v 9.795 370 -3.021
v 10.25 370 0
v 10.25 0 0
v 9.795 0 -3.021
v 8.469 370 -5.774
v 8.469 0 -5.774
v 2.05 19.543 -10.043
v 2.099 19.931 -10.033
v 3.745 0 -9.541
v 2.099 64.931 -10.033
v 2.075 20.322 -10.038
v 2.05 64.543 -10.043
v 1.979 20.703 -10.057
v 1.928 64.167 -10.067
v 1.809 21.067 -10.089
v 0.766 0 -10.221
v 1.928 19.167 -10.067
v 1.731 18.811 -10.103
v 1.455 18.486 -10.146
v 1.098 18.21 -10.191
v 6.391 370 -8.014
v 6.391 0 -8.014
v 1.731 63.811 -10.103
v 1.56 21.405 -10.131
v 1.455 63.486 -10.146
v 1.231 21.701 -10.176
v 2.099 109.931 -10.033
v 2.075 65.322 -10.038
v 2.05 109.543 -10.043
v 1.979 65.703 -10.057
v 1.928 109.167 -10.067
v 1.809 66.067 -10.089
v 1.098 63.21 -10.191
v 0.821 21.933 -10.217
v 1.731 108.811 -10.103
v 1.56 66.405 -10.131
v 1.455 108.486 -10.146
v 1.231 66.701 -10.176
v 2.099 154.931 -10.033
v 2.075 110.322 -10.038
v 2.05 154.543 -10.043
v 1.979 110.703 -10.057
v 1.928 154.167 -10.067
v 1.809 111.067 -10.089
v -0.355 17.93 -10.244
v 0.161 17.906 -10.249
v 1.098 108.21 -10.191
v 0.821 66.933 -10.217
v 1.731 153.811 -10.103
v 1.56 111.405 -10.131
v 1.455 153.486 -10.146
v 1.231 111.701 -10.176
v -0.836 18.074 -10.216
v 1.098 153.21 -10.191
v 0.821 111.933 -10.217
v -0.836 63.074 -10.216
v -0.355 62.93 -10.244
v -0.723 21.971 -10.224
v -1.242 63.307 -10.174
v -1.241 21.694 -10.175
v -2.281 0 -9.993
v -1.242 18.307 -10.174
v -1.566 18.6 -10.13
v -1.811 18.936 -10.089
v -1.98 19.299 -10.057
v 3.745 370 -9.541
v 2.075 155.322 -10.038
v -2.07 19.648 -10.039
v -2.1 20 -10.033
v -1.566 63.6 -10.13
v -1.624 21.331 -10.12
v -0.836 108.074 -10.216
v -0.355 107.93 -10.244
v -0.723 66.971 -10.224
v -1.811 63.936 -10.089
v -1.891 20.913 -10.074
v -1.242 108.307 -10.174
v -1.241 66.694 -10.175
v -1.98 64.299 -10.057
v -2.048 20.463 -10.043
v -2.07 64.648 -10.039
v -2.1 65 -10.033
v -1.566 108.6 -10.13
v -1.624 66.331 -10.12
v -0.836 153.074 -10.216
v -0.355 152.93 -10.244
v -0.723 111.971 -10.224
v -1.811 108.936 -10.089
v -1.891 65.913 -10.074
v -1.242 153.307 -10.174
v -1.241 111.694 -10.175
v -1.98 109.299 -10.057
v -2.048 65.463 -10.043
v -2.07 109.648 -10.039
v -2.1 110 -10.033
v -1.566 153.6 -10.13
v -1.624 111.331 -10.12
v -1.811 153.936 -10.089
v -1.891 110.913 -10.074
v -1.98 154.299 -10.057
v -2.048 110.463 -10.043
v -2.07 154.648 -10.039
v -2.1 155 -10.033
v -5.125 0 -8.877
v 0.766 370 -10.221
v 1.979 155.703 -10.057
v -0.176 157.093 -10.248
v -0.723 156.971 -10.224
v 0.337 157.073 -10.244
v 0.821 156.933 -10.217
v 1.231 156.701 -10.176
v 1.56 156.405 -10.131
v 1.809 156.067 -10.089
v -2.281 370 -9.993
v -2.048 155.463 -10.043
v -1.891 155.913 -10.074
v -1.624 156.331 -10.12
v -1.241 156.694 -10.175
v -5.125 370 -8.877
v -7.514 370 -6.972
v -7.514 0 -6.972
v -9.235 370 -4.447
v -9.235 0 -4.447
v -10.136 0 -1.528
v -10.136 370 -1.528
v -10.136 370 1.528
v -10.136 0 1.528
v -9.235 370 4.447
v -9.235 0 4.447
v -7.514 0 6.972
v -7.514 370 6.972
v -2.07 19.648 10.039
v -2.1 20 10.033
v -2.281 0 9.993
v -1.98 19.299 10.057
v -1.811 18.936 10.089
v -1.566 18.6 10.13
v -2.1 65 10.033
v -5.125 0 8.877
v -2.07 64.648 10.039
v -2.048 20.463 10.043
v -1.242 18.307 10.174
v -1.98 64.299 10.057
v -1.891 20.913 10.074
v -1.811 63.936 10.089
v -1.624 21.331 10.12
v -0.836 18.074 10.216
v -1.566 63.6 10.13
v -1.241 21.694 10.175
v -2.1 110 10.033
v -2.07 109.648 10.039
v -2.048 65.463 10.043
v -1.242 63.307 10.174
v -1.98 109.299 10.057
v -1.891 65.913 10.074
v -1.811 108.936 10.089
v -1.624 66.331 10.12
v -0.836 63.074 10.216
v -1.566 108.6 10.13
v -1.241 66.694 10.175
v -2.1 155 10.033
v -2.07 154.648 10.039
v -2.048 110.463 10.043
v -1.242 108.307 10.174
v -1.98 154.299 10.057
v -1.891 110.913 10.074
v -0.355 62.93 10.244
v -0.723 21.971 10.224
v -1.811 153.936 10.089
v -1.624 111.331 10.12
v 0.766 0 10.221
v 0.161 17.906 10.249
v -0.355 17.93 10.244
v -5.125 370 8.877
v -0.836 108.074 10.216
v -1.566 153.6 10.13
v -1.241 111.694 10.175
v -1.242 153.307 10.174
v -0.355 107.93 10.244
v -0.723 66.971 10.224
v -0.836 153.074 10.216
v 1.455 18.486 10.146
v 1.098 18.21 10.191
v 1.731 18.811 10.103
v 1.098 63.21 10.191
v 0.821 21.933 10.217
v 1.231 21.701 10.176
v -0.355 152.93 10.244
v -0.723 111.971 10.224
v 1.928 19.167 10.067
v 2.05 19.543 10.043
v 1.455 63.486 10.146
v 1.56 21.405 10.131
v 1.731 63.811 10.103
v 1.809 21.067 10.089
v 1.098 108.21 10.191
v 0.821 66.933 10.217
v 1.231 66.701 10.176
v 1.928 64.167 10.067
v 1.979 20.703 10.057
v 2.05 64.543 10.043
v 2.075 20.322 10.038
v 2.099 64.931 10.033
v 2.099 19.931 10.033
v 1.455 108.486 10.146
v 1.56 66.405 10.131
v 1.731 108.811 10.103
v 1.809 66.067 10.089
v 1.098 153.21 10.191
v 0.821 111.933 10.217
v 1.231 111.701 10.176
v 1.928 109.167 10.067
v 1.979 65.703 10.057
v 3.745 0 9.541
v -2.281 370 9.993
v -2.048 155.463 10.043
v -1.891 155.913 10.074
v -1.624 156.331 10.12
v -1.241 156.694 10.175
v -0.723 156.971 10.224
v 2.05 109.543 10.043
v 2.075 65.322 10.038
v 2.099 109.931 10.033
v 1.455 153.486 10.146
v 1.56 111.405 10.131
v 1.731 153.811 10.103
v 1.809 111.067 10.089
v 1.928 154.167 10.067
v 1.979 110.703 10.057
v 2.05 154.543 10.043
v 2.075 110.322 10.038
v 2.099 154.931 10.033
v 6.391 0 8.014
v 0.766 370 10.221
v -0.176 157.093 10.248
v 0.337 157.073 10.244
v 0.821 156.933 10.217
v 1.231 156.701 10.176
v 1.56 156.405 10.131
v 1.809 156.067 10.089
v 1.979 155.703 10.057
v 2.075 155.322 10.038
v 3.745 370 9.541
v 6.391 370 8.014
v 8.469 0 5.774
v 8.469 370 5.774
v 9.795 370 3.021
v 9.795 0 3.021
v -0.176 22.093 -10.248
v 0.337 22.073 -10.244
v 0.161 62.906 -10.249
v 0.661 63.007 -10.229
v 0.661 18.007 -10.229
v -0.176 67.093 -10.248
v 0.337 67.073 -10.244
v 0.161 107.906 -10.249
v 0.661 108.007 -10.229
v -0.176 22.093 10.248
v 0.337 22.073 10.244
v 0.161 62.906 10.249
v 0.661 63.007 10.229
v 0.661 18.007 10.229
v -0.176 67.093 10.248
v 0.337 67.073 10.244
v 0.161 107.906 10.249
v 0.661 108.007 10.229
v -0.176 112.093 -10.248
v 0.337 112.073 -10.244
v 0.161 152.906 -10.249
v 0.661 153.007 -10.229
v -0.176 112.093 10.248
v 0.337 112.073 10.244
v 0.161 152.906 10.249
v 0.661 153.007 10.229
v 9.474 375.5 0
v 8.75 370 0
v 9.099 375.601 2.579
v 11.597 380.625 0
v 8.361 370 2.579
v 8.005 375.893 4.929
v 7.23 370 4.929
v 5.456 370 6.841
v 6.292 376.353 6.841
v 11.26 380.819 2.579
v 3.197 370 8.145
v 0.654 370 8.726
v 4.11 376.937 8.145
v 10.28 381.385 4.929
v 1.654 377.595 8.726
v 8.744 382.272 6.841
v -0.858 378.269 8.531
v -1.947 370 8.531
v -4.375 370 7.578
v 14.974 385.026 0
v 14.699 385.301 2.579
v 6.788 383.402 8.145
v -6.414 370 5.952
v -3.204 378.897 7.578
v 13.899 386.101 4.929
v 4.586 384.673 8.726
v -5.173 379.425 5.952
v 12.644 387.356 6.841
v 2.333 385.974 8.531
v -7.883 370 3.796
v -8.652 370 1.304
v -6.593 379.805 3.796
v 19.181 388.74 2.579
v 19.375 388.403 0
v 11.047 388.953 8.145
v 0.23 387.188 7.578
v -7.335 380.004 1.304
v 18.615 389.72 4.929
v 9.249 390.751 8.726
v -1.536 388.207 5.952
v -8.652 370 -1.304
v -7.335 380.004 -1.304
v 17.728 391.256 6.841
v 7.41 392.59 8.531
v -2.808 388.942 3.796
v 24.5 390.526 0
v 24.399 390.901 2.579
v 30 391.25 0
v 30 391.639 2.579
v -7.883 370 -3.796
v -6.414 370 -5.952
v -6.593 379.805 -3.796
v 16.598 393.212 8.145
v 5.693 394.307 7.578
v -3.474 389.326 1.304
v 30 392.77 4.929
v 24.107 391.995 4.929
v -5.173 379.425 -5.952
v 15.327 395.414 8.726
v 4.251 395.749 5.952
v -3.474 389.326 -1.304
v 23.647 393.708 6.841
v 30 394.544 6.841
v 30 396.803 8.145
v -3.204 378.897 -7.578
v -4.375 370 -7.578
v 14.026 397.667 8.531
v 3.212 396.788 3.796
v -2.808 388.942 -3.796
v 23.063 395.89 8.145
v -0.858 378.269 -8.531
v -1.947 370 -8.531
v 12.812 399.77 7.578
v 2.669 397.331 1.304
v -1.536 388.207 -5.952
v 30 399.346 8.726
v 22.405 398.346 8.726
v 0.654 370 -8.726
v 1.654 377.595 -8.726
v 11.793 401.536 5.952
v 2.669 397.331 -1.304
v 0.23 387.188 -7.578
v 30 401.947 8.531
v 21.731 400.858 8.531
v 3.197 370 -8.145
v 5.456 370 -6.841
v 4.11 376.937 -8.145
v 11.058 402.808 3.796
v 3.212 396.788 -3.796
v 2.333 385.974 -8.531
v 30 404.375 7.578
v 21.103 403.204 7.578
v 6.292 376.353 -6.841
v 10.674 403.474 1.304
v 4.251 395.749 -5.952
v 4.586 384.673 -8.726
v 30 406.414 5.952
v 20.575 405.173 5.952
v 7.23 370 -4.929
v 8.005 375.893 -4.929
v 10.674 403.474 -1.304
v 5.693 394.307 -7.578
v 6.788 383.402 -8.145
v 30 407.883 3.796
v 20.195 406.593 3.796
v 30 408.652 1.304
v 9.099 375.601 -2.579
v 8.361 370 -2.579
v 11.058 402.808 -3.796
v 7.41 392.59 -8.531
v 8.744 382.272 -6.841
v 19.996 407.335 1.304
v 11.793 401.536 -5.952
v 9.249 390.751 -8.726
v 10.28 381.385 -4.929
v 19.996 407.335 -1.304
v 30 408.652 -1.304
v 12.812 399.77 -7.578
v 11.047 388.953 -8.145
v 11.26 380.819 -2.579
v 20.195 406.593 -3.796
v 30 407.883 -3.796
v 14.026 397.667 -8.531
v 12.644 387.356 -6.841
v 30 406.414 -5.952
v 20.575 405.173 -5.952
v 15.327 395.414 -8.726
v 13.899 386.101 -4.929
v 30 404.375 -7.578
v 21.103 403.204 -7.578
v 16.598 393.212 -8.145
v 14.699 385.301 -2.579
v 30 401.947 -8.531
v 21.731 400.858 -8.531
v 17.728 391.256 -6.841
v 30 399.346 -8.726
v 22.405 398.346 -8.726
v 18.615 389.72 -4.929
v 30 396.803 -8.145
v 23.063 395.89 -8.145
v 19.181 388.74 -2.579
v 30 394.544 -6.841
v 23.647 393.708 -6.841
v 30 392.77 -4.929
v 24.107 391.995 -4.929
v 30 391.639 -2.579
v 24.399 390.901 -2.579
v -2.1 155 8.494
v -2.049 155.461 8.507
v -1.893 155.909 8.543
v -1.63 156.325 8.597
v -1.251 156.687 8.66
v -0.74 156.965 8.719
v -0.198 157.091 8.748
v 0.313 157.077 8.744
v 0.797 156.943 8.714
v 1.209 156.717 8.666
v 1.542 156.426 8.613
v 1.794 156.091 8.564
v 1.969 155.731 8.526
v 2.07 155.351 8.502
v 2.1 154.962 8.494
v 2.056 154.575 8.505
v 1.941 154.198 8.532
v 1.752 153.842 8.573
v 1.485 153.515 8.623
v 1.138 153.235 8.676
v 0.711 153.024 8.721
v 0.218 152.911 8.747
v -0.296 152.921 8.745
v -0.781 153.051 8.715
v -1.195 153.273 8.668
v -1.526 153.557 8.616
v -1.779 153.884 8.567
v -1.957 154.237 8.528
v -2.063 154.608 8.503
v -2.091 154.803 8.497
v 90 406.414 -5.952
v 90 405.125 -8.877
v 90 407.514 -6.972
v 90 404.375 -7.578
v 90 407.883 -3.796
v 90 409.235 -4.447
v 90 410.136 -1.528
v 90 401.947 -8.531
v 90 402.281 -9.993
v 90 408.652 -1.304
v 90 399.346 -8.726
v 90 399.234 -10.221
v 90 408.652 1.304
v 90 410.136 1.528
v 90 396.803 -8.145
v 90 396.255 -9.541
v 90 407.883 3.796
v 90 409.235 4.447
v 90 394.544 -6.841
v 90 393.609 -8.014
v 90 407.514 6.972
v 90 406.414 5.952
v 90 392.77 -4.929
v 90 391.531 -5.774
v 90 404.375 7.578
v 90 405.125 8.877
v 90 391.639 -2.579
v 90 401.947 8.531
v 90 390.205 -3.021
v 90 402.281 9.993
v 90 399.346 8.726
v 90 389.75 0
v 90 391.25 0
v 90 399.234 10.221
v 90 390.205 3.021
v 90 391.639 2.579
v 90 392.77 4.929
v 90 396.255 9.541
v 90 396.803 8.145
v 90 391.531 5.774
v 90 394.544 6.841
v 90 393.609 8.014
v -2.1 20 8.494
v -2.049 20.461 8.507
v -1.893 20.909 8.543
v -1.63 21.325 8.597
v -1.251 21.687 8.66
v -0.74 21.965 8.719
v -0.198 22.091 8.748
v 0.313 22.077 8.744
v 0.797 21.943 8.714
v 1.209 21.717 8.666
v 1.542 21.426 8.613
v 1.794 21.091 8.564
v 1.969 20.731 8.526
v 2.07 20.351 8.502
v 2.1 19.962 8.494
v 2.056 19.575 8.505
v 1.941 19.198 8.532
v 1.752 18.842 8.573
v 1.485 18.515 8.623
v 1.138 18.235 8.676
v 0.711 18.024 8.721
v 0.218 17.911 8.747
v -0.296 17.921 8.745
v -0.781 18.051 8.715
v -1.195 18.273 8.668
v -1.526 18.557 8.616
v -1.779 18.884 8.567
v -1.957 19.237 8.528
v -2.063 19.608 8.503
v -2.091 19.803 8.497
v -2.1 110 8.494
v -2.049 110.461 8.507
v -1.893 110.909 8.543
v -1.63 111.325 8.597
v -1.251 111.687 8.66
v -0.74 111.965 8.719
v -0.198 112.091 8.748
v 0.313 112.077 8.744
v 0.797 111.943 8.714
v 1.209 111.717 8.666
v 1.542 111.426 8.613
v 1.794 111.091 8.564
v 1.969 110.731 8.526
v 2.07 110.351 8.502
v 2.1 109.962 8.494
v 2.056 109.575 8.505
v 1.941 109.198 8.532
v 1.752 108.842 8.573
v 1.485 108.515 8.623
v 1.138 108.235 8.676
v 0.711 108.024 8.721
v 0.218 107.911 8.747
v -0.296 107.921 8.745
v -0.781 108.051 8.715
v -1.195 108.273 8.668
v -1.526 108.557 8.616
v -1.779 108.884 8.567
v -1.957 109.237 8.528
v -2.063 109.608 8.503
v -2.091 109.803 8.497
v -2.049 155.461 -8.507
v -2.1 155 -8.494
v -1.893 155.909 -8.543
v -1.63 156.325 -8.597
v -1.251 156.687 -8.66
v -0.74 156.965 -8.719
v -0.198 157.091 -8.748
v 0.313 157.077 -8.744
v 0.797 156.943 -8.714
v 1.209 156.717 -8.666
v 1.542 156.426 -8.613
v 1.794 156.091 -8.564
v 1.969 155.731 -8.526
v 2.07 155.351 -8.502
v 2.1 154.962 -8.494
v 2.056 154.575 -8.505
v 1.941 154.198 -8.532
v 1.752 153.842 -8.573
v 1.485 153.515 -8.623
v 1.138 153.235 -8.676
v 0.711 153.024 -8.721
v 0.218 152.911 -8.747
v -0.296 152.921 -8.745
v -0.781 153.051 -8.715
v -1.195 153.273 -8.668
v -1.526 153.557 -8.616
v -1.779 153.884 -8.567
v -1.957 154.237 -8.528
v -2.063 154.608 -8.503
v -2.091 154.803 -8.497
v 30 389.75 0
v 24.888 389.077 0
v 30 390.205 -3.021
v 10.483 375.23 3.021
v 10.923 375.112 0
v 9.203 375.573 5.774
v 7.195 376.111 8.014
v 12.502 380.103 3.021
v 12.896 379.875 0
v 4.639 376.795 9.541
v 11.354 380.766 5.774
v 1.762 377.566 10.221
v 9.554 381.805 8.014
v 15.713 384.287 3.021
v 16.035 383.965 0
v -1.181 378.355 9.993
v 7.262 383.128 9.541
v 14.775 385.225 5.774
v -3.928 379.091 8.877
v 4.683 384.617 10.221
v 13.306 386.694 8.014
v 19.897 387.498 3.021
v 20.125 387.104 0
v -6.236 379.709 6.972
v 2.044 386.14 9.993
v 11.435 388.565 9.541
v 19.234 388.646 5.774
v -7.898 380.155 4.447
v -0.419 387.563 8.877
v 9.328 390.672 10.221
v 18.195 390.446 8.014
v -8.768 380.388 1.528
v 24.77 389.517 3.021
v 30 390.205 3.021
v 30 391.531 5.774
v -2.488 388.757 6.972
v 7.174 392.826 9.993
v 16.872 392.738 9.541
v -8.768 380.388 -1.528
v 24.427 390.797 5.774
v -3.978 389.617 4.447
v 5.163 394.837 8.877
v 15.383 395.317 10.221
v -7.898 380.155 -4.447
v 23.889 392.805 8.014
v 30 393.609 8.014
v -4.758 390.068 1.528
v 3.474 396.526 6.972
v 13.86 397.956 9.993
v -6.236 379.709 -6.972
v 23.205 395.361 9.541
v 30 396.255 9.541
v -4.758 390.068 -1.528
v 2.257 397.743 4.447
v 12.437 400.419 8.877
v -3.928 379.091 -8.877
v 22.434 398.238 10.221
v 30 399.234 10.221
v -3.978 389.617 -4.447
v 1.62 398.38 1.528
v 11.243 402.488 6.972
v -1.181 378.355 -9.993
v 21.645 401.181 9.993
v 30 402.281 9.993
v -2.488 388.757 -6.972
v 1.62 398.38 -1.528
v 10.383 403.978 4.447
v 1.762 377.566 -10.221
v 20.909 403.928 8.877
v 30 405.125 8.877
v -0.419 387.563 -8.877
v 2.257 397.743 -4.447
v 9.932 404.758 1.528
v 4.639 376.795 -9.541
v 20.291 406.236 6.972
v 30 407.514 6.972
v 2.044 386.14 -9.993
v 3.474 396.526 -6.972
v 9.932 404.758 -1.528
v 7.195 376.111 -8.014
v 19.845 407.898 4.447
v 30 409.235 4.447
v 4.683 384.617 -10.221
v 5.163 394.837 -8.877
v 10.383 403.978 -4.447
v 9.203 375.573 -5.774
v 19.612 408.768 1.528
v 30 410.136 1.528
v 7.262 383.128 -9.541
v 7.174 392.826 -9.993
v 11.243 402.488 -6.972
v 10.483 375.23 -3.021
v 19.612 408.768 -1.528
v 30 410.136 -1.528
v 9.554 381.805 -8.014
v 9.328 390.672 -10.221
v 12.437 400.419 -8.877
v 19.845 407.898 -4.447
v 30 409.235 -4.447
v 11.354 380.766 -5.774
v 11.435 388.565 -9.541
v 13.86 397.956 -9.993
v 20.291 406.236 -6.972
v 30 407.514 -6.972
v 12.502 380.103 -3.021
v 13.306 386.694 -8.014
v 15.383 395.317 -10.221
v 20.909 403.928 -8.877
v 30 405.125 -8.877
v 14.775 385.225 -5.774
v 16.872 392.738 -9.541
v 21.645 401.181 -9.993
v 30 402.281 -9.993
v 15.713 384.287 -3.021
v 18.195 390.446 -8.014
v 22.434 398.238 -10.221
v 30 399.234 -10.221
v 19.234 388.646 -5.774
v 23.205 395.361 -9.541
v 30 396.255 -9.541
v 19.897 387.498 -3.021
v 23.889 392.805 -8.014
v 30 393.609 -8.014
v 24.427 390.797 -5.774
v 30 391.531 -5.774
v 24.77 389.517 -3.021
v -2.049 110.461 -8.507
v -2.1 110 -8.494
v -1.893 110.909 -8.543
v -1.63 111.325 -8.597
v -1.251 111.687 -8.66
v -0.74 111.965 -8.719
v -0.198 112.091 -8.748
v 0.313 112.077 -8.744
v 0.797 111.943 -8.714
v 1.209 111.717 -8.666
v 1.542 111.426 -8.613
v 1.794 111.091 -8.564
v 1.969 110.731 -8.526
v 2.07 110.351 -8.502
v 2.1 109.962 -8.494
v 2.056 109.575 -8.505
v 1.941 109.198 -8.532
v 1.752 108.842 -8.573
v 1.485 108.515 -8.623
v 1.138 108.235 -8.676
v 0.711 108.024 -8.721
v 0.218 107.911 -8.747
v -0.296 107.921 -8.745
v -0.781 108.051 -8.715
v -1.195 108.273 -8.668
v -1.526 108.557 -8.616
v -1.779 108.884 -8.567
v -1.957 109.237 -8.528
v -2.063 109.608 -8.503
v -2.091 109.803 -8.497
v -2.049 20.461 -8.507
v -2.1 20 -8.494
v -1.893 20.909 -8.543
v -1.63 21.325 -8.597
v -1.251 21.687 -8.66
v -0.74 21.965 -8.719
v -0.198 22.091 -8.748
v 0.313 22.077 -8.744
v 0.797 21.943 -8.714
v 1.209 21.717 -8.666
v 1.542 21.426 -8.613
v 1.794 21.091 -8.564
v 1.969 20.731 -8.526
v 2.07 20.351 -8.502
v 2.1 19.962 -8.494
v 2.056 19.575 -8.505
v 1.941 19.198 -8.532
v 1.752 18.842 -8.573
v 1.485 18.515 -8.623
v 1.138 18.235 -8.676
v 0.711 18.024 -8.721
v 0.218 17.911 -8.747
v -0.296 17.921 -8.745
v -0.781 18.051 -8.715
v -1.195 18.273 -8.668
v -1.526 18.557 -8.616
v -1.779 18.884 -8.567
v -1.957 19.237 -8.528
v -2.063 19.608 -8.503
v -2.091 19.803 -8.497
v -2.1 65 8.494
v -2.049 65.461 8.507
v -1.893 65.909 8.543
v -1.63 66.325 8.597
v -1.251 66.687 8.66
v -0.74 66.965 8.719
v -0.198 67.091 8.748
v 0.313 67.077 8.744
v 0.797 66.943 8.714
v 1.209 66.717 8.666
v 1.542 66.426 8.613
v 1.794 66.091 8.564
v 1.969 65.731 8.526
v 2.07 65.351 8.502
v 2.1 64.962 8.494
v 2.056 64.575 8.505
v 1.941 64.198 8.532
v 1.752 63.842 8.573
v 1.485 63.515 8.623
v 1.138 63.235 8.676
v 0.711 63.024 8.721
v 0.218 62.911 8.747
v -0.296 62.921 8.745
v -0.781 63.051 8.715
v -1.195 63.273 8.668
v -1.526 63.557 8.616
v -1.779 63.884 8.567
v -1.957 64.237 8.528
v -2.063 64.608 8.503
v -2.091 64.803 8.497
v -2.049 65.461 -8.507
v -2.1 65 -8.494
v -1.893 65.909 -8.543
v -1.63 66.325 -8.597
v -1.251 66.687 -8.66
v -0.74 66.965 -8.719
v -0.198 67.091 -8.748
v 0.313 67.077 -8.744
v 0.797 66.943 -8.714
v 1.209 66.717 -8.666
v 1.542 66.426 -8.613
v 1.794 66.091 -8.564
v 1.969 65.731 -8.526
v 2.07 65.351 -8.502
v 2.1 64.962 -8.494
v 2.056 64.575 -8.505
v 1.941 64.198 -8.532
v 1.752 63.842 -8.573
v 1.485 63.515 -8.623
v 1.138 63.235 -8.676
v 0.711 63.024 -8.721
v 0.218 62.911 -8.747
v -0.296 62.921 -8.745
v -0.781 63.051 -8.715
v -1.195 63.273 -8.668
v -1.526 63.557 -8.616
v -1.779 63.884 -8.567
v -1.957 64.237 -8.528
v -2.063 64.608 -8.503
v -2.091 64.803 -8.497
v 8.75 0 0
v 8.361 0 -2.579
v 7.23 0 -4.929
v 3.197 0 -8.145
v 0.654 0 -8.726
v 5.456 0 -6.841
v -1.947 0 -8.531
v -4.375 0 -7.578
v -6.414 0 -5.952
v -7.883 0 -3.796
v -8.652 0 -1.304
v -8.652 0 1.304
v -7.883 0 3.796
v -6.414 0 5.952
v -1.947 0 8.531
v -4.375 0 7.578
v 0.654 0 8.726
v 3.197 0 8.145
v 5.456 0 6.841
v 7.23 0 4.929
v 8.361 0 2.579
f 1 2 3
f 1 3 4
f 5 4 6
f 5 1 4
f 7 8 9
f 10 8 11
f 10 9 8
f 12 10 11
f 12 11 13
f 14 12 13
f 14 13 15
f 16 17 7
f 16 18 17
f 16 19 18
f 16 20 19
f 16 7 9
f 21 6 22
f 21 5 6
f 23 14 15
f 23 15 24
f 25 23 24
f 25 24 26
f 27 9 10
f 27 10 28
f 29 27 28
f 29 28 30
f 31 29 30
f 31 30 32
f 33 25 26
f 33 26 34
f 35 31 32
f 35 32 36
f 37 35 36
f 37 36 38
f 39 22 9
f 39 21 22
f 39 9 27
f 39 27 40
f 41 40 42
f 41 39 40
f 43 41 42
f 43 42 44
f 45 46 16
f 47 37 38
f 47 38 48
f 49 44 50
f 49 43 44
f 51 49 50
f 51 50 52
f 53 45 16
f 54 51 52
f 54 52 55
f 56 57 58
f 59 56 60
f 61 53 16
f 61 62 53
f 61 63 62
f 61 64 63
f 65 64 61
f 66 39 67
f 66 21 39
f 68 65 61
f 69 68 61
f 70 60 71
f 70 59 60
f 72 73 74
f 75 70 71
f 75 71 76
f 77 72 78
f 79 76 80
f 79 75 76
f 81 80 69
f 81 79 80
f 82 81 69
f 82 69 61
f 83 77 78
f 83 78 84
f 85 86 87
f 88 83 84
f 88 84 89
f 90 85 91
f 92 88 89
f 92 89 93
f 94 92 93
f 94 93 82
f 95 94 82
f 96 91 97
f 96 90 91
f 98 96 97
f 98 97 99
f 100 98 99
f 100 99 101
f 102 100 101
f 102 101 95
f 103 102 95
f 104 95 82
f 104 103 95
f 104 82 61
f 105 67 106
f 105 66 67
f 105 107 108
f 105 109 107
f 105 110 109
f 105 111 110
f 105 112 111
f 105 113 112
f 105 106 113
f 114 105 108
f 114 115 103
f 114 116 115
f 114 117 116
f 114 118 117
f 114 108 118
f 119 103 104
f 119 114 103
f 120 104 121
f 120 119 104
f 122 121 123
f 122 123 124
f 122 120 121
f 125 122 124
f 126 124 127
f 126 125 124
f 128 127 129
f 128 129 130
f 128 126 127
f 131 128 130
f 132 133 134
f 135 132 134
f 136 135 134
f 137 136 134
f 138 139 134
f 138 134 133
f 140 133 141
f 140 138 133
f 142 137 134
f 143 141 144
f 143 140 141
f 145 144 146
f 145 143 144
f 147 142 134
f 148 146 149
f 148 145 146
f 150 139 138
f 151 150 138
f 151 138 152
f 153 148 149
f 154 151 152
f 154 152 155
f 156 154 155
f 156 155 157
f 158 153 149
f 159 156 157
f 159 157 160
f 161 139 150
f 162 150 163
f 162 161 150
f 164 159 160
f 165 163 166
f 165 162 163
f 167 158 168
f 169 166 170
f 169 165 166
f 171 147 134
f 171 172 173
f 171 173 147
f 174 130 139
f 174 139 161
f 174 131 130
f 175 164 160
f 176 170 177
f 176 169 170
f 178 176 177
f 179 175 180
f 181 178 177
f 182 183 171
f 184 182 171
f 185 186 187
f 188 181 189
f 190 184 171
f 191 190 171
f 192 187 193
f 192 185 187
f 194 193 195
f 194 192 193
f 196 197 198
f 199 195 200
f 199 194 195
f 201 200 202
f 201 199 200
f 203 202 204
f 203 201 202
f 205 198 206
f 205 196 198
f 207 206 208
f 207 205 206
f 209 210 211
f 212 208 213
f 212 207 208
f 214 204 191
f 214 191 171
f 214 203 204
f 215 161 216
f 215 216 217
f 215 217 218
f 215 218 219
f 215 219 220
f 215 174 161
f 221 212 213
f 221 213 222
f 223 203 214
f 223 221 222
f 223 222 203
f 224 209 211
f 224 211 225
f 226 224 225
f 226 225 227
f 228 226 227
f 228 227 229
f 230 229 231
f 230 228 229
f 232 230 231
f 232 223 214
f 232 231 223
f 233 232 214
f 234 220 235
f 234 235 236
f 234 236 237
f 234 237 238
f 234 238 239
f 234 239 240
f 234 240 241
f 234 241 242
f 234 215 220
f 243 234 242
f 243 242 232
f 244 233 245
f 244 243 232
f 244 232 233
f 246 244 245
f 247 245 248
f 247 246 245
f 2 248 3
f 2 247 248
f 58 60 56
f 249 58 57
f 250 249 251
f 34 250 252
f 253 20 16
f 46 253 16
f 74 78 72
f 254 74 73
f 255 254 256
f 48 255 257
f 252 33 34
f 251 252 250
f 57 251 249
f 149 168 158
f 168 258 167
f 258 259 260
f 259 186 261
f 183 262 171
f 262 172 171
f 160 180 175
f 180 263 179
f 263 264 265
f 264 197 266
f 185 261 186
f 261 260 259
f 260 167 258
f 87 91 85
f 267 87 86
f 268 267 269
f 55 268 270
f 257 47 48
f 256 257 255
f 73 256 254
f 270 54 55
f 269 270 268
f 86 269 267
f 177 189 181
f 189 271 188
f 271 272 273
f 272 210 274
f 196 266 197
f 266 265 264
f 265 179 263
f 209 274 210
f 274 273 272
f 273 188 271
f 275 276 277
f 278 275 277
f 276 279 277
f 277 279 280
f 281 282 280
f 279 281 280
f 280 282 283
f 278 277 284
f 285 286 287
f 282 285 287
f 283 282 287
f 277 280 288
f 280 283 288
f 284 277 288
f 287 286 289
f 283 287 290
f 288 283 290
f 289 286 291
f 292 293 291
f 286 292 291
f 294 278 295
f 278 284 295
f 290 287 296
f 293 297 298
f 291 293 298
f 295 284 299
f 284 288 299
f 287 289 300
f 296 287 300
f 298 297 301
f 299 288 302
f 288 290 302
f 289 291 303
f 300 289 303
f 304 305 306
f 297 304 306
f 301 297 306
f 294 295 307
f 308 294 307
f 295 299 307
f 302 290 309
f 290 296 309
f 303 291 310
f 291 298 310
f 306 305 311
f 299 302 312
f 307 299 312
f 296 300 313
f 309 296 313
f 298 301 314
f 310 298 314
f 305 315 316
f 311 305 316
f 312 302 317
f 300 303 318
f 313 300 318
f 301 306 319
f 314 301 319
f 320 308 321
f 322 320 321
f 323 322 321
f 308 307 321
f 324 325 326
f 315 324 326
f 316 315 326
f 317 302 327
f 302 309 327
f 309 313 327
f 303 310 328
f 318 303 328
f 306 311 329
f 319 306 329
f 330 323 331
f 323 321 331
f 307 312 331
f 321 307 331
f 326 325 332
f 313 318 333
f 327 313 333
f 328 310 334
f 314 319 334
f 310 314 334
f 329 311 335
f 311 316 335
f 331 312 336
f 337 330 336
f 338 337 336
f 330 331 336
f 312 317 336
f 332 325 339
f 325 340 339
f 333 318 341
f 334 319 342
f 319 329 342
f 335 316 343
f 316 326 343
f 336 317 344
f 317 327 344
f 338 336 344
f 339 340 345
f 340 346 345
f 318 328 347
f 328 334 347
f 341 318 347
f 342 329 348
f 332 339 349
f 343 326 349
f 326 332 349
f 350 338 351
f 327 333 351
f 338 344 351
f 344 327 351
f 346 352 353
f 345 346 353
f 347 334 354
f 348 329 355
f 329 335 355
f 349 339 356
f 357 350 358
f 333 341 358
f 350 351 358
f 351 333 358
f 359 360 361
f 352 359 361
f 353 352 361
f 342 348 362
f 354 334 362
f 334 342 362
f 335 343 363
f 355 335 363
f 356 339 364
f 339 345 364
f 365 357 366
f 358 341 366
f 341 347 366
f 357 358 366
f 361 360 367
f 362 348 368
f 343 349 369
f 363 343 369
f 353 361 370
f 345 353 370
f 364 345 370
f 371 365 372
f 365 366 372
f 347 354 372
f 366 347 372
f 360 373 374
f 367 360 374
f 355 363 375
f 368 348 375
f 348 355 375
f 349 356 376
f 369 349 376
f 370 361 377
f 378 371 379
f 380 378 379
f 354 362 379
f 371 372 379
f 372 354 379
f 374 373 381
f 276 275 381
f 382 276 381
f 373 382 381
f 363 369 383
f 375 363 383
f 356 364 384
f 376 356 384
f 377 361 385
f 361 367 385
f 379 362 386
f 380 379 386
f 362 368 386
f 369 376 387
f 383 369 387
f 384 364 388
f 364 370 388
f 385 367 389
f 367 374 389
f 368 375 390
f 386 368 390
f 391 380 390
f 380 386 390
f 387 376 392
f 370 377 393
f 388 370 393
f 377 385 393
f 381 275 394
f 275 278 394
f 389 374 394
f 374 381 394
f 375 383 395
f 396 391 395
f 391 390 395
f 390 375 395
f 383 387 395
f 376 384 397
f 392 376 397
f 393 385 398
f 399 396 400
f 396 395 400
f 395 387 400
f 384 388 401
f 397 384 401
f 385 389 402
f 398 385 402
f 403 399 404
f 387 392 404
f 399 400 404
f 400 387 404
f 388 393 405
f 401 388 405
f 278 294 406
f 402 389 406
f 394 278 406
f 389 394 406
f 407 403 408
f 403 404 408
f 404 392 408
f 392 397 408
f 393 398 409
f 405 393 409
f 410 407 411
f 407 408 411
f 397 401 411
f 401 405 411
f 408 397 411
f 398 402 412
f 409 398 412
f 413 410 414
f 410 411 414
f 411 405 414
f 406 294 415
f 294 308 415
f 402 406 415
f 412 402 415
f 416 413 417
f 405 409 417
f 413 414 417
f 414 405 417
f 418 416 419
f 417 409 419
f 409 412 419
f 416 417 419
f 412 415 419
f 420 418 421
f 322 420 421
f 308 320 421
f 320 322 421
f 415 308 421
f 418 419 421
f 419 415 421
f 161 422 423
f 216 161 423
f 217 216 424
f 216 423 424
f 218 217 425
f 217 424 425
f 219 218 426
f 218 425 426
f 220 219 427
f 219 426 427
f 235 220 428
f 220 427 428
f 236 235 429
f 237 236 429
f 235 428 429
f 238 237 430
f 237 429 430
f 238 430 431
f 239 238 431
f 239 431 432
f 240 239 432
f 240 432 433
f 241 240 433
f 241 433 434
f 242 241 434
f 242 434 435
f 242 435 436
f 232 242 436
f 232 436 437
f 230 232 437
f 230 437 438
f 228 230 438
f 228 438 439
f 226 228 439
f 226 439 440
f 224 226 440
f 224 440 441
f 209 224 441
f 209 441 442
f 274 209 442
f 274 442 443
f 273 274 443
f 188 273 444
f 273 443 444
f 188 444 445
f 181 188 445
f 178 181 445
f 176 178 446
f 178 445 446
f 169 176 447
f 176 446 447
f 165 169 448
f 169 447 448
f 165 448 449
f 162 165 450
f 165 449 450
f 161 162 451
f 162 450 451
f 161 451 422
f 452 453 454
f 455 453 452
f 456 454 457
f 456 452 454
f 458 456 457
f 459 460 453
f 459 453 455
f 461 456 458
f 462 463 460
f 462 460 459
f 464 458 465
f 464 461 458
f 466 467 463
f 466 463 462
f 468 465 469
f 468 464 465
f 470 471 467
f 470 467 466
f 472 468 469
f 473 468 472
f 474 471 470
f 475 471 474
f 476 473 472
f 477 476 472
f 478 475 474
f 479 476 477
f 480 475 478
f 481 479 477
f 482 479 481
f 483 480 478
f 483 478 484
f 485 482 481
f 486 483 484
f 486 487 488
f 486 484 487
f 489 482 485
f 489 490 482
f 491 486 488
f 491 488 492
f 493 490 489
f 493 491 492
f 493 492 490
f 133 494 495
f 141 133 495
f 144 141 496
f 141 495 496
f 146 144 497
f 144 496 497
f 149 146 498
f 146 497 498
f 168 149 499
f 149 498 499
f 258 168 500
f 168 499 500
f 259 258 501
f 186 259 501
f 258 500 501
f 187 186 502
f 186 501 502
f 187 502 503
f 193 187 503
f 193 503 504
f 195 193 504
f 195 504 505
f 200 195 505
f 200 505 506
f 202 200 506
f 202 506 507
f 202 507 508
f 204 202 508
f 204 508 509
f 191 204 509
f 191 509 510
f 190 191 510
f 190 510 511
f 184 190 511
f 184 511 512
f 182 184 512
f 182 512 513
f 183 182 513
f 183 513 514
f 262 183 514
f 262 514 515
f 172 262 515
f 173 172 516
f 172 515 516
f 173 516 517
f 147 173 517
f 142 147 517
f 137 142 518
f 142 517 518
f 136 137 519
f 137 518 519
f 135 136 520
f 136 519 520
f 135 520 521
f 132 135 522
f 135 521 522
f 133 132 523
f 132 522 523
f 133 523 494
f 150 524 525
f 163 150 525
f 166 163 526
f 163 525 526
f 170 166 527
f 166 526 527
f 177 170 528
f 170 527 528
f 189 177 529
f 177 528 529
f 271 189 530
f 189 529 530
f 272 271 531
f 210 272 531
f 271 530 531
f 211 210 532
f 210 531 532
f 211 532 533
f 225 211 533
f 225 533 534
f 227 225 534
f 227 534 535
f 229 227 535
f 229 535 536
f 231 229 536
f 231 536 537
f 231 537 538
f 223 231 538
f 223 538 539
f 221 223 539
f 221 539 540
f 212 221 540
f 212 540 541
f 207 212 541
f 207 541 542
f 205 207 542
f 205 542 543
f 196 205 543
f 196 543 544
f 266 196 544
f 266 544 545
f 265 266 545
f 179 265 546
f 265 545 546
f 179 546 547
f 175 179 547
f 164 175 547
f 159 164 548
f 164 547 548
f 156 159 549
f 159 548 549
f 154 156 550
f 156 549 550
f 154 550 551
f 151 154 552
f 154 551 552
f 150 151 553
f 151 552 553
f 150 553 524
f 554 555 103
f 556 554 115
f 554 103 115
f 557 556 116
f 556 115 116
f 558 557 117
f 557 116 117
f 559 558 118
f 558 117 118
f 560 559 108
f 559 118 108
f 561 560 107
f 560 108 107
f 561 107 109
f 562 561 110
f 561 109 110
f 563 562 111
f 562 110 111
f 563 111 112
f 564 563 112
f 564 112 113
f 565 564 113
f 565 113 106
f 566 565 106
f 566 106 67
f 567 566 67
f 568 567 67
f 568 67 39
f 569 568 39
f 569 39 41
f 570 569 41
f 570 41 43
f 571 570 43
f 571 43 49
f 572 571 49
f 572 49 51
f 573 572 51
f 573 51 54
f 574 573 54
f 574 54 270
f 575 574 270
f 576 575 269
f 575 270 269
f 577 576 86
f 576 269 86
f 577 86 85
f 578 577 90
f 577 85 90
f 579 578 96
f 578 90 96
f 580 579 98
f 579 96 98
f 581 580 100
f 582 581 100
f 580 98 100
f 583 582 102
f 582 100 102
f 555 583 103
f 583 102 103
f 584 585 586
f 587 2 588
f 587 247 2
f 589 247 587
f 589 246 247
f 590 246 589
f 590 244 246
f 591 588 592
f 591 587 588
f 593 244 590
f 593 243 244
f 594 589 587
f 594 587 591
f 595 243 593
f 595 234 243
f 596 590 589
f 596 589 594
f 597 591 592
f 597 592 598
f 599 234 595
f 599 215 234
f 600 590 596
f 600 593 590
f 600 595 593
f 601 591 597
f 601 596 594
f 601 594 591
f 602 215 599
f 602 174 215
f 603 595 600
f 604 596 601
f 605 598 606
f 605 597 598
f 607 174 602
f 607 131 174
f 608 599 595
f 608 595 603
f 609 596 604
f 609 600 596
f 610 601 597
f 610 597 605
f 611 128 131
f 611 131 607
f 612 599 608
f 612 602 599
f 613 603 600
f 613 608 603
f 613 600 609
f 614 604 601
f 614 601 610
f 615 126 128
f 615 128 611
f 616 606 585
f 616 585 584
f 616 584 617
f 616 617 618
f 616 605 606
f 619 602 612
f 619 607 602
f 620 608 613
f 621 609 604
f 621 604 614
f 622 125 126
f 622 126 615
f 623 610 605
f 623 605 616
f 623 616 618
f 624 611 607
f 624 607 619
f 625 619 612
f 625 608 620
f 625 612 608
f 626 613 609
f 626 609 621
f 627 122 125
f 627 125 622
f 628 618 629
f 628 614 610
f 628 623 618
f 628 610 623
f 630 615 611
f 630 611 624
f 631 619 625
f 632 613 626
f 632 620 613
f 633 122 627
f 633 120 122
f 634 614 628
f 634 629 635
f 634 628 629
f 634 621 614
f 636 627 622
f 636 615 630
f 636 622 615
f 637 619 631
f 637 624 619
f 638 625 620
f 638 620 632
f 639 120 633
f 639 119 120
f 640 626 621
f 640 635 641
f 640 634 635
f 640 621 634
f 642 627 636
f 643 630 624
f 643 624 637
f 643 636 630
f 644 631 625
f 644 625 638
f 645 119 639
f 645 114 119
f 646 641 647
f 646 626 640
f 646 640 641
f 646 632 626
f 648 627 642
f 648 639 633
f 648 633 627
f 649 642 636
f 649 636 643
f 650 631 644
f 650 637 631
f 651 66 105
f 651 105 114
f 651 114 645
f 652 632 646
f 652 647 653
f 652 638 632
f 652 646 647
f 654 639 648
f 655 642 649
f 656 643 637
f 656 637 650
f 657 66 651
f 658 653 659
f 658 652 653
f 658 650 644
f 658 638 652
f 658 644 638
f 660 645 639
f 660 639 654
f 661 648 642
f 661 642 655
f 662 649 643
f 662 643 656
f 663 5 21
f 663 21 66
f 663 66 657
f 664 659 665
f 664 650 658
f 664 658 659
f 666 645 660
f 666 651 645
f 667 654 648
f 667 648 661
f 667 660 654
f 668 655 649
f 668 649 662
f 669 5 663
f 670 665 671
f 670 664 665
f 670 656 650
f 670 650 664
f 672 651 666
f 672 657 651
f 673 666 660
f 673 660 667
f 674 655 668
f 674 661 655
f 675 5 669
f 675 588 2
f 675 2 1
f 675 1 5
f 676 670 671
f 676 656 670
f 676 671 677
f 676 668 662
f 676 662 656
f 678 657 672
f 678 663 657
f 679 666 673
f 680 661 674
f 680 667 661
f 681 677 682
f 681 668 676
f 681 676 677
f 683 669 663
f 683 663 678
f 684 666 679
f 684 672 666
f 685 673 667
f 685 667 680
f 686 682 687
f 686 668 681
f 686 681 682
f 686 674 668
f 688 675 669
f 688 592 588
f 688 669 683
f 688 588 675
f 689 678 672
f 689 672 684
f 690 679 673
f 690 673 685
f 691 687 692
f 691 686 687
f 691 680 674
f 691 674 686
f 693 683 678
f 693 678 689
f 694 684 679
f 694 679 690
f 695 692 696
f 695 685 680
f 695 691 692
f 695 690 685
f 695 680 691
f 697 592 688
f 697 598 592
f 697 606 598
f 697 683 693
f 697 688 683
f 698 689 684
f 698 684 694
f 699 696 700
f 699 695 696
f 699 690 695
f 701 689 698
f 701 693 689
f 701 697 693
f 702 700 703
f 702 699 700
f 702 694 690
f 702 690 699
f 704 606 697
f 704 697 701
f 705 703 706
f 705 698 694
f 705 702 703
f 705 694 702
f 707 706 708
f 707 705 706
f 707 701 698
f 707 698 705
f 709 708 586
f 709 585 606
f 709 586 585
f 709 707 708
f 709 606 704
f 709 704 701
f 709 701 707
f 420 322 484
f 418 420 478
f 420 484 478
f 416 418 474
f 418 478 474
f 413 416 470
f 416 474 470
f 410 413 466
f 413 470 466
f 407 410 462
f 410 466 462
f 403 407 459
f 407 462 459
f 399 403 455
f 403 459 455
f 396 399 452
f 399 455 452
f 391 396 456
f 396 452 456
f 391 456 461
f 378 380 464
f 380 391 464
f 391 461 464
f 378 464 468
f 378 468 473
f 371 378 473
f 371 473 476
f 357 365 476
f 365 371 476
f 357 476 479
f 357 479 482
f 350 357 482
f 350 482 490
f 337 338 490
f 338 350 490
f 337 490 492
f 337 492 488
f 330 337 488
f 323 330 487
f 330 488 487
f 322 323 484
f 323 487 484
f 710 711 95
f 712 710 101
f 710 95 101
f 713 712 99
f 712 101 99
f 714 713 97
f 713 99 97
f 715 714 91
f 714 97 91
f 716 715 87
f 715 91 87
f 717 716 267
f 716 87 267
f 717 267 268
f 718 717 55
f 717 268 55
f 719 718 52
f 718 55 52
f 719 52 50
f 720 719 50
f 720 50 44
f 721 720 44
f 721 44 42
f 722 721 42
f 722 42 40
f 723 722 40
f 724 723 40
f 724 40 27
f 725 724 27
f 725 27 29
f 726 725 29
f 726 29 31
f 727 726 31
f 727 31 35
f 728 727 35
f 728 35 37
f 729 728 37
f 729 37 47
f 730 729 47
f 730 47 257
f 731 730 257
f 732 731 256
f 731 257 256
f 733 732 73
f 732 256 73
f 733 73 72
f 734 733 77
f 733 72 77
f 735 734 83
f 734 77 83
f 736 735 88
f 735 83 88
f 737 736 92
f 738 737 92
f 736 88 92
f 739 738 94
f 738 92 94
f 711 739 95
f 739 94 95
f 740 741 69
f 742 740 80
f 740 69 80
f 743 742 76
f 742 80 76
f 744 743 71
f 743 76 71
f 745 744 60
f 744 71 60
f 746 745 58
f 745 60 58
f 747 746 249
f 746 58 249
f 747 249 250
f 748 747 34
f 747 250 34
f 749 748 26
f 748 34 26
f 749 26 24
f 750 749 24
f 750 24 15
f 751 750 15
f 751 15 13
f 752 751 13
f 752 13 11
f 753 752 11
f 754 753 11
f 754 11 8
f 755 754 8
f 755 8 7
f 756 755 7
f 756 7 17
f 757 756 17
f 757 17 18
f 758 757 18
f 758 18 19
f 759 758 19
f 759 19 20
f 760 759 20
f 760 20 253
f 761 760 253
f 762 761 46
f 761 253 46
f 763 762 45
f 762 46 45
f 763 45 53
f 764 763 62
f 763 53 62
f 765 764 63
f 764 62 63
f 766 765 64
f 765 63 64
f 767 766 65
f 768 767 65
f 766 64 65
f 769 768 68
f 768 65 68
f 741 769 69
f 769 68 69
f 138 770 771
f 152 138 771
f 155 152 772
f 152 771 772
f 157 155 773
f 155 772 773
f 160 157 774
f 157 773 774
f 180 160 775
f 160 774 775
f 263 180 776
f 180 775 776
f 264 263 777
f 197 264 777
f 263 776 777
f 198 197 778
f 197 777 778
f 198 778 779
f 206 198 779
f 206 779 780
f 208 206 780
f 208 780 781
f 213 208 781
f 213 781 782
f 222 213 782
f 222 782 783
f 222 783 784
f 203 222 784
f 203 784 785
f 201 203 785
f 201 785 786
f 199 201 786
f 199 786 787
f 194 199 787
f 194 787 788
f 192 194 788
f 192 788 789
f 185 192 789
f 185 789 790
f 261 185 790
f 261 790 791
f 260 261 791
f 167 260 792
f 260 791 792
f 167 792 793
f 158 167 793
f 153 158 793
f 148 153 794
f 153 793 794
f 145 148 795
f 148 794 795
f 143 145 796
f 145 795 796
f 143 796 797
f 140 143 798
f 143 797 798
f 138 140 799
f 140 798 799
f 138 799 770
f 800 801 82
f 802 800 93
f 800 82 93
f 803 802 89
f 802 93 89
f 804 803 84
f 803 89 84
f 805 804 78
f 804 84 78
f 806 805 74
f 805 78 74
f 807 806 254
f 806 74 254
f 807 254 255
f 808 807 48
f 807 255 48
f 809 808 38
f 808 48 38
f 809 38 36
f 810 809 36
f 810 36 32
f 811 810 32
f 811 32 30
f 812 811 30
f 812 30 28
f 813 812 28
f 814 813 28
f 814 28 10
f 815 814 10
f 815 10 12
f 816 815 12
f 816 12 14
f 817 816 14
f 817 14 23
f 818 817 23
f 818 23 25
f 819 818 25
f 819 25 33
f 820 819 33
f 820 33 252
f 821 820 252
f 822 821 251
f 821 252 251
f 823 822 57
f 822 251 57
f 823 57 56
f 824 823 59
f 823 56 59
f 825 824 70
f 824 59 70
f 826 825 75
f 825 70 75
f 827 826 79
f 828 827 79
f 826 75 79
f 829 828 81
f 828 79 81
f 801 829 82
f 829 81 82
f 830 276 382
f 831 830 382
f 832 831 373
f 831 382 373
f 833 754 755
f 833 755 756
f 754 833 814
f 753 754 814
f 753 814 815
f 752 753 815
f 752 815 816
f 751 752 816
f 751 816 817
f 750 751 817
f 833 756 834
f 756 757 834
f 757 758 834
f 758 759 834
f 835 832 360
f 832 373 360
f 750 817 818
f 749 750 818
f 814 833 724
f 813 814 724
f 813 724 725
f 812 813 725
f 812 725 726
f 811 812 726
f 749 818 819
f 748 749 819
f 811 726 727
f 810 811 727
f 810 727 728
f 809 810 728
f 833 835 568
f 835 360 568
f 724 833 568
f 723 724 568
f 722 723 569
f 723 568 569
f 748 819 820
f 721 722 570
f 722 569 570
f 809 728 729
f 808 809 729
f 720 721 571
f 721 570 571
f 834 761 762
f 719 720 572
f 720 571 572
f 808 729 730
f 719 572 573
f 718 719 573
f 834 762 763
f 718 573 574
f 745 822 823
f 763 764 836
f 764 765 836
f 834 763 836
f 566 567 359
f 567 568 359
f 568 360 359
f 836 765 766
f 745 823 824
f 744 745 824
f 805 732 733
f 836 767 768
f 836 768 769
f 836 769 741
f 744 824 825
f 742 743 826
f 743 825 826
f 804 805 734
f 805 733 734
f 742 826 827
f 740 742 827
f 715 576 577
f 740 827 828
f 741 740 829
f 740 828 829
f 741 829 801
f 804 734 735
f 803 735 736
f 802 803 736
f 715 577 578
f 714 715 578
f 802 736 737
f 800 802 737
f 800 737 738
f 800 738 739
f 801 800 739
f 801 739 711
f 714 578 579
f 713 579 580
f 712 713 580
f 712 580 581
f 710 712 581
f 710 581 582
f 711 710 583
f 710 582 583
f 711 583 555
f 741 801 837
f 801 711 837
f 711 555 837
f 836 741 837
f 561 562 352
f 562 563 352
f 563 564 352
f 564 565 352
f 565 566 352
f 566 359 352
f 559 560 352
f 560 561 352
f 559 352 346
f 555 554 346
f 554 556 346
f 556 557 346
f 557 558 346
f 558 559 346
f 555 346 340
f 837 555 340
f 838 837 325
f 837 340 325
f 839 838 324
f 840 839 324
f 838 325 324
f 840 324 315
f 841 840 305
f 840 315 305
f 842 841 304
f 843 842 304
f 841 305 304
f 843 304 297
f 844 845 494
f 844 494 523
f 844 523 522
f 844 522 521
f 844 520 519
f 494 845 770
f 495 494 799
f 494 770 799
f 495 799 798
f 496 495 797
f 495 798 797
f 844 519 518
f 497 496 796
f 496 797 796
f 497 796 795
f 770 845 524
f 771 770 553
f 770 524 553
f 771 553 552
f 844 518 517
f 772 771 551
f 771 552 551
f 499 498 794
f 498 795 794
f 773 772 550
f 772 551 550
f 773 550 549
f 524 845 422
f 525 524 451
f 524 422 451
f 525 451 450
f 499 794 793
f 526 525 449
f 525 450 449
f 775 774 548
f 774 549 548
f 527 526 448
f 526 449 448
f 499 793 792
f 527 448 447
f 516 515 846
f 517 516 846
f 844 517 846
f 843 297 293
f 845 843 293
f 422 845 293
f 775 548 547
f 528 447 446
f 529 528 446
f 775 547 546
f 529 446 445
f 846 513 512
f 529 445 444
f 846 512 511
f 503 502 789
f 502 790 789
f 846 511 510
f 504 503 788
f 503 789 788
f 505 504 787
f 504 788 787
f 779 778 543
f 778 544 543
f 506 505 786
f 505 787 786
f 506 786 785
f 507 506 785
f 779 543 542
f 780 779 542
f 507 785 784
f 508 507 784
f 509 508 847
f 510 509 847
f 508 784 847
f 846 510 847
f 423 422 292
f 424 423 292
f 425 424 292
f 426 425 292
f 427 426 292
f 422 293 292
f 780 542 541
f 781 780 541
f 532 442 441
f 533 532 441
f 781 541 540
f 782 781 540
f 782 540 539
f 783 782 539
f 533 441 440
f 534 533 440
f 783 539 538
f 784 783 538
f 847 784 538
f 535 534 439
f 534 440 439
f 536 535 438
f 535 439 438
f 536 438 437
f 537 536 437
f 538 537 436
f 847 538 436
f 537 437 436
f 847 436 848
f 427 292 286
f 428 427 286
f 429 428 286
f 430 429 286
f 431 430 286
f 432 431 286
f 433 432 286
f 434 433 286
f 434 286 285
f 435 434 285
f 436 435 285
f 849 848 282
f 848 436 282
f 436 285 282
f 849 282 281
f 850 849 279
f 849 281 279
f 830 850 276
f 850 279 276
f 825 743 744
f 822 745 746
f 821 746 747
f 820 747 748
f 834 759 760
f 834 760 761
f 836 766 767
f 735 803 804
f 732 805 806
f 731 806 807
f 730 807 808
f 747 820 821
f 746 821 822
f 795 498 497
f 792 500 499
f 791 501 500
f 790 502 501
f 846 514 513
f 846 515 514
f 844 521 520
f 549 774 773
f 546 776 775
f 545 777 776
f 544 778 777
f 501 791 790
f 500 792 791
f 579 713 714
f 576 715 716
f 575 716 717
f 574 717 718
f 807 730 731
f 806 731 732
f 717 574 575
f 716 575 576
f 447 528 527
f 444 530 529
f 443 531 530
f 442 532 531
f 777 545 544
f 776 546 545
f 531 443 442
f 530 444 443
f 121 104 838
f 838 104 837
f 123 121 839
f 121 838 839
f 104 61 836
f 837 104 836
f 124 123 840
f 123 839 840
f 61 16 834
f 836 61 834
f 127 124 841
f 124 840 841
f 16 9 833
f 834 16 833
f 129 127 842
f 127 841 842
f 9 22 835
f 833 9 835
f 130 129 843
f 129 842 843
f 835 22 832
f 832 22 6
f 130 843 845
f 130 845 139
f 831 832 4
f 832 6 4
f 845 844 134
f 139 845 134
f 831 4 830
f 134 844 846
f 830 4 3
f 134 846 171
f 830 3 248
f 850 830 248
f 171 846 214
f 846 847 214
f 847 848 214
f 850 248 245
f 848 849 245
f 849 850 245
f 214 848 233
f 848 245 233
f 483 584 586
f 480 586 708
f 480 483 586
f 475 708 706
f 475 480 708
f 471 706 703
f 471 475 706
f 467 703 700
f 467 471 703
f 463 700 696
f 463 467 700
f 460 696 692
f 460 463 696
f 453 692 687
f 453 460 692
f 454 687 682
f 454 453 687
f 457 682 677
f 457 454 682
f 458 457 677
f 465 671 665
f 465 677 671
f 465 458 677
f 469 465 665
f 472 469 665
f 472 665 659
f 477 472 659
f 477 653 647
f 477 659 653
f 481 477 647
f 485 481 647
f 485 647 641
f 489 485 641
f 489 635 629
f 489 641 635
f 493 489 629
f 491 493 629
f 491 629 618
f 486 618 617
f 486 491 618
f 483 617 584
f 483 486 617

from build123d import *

# Parameters (mm, degrees)
ESBO_O2_R             = 10.25
ESBO_O2_R_2           = 8.75
FURO_ROSCADO_DE_M51_D = 4.2
PADR_O_LINEAR1_COUNT  = 4
PADR_O_LINEAR1_PITCH  = 45


with BuildPart() as part:
    # Varredura1: sweep along a path in Esboço1
    with BuildLine(Plane.XY) as varredura1_path:
        Line((0, 0), (0, 370))
        ThreePointArc((0, 370), (8.786796564, 391.213203436), (30, 400))
        Line((30, 400), (90, 400))
    # Esboço2 → Varredura1 (sweep)
    with BuildSketch(Plane(origin=(0, 0, 0), x_dir=(1, 0, 0), z_dir=(0, 1, 0))):
        Circle(ESBO_O2_R)
        Circle(ESBO_O2_R_2, mode=Mode.SUBTRACT)
    sweep(path=varredura1_path.line)

    # Furo roscado de M51 (through all)
    with Locations(Plane.XY.offset(11)):
        with Locations((0, 20)):
            furo_roscado_de_m51 = Hole(FURO_ROSCADO_DE_M51_D / 2)

    # Padrão linear1: Furo roscado de M51 ×4
    with Locations(*[(0, i * PADR_O_LINEAR1_PITCH, 0) for i in range(1, PADR_O_LINEAR1_COUNT)]):
        add(furo_roscado_de_m51, mode=Mode.SUBTRACT)


solid = part.part
